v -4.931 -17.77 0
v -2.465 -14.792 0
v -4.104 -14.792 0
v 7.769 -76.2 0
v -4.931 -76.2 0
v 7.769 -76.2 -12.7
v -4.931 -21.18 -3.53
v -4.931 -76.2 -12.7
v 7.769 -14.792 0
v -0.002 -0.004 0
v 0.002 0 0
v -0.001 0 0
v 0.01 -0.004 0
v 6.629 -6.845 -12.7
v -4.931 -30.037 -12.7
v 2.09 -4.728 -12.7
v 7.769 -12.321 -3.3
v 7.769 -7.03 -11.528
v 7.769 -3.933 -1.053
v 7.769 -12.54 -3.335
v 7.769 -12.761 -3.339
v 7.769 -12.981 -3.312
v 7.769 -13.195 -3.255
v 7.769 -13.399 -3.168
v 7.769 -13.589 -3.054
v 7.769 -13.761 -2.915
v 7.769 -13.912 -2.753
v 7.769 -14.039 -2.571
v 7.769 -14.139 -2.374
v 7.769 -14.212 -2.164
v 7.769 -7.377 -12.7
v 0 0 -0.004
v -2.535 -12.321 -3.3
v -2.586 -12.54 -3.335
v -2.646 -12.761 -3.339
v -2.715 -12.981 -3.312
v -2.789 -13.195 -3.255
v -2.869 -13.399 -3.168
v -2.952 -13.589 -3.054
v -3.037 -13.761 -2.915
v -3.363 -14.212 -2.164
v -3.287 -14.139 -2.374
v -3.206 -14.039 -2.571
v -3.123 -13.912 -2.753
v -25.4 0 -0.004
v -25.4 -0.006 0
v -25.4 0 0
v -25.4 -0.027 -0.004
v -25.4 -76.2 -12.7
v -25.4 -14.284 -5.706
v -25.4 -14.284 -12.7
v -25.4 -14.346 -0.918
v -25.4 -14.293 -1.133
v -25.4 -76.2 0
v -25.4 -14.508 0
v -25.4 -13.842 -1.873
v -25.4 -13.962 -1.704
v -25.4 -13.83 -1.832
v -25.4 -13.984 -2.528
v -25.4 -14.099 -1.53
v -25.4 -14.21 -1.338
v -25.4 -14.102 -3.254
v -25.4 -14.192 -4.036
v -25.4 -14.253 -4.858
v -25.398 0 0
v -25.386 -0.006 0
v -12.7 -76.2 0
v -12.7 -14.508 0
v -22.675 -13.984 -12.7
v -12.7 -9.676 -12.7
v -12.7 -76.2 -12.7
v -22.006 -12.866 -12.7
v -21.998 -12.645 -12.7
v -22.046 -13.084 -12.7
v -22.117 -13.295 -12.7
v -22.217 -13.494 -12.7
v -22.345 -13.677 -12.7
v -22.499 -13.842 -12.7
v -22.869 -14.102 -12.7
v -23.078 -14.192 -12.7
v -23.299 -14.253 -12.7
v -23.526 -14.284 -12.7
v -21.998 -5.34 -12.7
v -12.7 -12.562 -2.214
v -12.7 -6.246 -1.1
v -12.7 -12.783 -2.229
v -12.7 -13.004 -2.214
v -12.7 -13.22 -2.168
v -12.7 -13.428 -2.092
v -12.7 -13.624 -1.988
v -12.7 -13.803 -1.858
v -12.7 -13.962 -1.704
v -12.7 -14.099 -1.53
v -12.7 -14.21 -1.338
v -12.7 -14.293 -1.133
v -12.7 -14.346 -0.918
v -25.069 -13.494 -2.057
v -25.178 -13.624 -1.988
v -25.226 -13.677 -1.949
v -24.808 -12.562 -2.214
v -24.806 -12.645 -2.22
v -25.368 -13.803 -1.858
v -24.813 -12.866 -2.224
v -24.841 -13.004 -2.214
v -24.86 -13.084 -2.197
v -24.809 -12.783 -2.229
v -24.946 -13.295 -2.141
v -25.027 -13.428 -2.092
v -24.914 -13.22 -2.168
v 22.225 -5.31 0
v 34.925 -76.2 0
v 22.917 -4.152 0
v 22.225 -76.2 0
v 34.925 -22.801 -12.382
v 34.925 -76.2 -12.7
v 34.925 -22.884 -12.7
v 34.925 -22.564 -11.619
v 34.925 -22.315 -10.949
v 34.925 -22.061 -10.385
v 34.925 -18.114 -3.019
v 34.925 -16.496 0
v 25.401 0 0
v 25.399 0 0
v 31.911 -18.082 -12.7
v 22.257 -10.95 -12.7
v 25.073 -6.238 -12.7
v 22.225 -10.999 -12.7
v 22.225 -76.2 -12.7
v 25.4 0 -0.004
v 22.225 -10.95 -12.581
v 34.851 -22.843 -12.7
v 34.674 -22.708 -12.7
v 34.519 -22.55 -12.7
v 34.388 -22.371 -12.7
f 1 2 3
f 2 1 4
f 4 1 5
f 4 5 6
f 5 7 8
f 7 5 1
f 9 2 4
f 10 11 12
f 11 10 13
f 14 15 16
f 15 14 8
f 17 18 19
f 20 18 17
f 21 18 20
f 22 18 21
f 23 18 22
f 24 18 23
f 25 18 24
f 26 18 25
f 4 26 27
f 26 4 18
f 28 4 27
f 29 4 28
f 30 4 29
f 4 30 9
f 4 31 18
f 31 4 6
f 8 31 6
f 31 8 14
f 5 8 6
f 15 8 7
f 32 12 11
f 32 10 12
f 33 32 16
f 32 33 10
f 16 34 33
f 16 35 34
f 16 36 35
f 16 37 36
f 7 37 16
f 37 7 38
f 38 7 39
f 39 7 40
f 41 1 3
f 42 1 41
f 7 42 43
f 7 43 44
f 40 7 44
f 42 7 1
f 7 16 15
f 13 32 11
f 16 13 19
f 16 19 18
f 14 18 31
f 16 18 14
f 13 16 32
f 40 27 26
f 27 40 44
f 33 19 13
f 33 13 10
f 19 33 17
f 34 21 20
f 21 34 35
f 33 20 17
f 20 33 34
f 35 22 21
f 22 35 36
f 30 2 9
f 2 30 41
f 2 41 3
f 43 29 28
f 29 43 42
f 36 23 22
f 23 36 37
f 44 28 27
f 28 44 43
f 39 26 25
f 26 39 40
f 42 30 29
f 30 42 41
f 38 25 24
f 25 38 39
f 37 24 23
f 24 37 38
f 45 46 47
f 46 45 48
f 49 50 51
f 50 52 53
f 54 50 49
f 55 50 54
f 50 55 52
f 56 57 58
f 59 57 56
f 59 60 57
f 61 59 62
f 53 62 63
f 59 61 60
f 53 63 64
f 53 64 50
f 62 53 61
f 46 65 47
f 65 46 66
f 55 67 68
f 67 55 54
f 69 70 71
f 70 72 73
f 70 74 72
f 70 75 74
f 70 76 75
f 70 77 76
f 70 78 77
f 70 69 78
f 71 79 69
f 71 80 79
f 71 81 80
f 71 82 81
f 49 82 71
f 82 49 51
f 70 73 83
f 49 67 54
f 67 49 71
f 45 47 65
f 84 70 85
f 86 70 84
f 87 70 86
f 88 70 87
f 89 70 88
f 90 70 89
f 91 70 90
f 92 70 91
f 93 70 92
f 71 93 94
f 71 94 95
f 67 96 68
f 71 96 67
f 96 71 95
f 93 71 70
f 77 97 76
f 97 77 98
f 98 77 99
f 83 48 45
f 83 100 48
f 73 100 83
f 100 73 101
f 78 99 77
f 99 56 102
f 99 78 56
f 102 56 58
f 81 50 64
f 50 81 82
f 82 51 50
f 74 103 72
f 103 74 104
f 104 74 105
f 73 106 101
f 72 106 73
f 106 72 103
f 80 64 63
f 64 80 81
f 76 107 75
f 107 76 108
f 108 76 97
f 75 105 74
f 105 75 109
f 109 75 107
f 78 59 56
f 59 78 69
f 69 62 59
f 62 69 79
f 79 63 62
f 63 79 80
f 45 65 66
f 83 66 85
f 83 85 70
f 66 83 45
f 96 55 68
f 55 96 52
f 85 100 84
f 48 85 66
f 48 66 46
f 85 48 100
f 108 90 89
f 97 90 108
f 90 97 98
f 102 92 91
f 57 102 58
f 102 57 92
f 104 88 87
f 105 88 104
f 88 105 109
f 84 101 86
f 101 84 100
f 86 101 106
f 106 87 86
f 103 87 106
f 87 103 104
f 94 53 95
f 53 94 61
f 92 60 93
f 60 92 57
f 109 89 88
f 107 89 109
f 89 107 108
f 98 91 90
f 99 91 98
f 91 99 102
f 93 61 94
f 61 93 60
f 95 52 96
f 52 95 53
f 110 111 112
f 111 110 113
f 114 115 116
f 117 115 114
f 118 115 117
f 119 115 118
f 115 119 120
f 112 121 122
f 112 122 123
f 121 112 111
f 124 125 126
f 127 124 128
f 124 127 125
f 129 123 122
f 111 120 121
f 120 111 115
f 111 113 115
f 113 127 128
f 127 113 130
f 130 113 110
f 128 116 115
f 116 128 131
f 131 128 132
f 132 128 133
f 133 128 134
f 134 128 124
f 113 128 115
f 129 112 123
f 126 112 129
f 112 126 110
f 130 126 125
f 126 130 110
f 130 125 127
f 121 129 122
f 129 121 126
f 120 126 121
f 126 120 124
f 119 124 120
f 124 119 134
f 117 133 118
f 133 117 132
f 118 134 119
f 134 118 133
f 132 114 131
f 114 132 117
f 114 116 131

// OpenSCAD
// Copyright 2019 Michael K Johnson
// Use allowed under Attribution 4.0 International (CC BY 4.0) license terms
// https://creativecommons.org/licenses/by/4.0/legalcode
// Model of Mikey's Square, Knife, and Threading Tools
// https://www.hobby-machinist.com/threads/models-for-grinding-hss-lathe-tools.62111/
// Scale 200-500% for printing, reducing length, to see closely
// All parameters are in inches, because that's common use
// https://me-mechanicalengineering.com/single-point-cutting-tool/ has definitions

// Stock is assumed to be square in cross section
stock_width = 0.5;
// Typical stock is 3-6 inches long; can reduce to print enlarged models to concentrate on shape of tip
stock_len = 3;
// To model the curve from the wheel; 6" and 8" are common
wheel_diameter = 8;
// Wheel or platen thickness; matters only if using this for visualizations
wheel_thickness = 1;
// Radius of the edge of the wheel/platen; shows at back edge of top cut
wheel_edge_radius = .0625;
// Common radii are .0156 (1/64") .03125 (1/32") .0625 (1/16") (Nose radius currently ignored)
nose_radius = .03125;
knife_nose_radius = 0.156;
// Side Cutting Edge Angle (SCEA)
side_cutting_edge_angle = 15;
// End Cutting Edge Angle (ECEA) is derived from the included angle of the tip, and is normally less than 90
tip_included_angle = 80;
knife_tip_included_angle = 65;
threading_tip_included_angle = 60;
// Back Rake (BR) 
back_rake_angle = 15;
// Back Rake depth ratio (depth of back rake relative to stock width; reduce for high BR)
back_rake_depth_ratio = 1;
// Knife Back Rake (BR) (knife tool)
knife_back_rake_angle = 10;
// Side Rake (SR)
side_rake_angle = 15;
// Side Relief
side_relief_angle = 15;
// End Relief ("Clearance")
end_relief_angle = 15;
// How far back the top of the tool the side cut extends, relative to the width of the stock; typically between 1 and 2
side_edge_aspect_ratio = 1.5;
threading_side_edge_aspect_ratio = 0.5;
// use_platen: true for belt grinder platen, false for wheel grinder
use_platen = true;

/* [Hidden] */

// true to use simple shapes for fast rendering while developing; false for more accurate shapes for final renders
fast_render = false;

function mm(inches) = inches * 25.4;

stock_w = mm(stock_width);
stock_l = mm(stock_len);
wheel_r = mm(wheel_diameter) / 2;
wheel_t = mm(wheel_thickness);
wheel_e_r = mm(wheel_edge_radius);
nose_r = mm(nose_radius);
knife_nose_r = mm(knife_nose_radius);

// Logical pre-rounded tip located at -pivot_offset
function pivot_offset(scea=side_cutting_edge_angle, sear=side_edge_aspect_ratio) = -mm(sear * stock_width) * sin(scea);

module smooth_wheel(r=wheel_r, t=wheel_t) {
    x = t/2 - wheel_e_r;
    y = r - mm(0.5);
    translate([0, r, 0])
    rotate([0, 90, 0])
    rotate_extrude($fa=1)
    rotate([0, 0, 90])
    translate([0, -(r-wheel_e_r), 0])
    hull() {
        translate([x, 0, 0]) circle(r=wheel_e_r, $fn=45);
        translate([-x, 0, 0]) circle(r=wheel_e_r, $fn=45);
        translate([x, y, 0]) circle(r=wheel_e_r, $fn=45);
        translate([-x, y, 0]) circle(r=wheel_e_r, $fn=45);
    }
}
module wheel(r=wheel_r, t=wheel_t) {
    z = -stock_w/2; // honed angles at edges will be as set
    // simple cylinder
    if (fast_render) {
        translate([-t/2, r, z]) rotate([90, 0, 90])
        cylinder(r=r, h=t, $fa=1);
    } else {
        smooth_wheel(r, t);
    }
}
module platen(h=wheel_r, t=wheel_t) {
    hull() {
        // front of platen
        translate([t/2, wheel_e_r, -h/2])
            cylinder(r=wheel_e_r, h=h, $fn=45);
        translate([-t/2, wheel_e_r, -h/2])
            cylinder(r=wheel_e_r, h=h, $fn=45);
        // extend it back to represent what will be cut out
        translate([t/2, t, -h/2])
            cylinder(r=wheel_e_r, h=h, $fn=45);
        translate([-t/2, t, -h/2])
            cylinder(r=wheel_e_r, h=h, $fn=45);
    }
}
module surface(t=wheel_t) {
    if (use_platen) {
        platen(t=t);
    } else {
        wheel(t=t);
    }
}
module stock(w=stock_w, l=stock_l, scea=side_cutting_edge_angle, sear=side_edge_aspect_ratio) {
    // origin is pivot point for cuts, oriented to be like using a wheel
    translate([pivot_offset(scea=scea, sear=sear), -l, -w])
        cube([w, l, w]);
}
module side_cut(br=back_rake_angle, era=end_relief_angle, sra=side_relief_angle, scea=side_cutting_edge_angle, sear=side_edge_aspect_ratio) {
    z = 90-scea;
    t = (scea*sra*era*br == 0) ? wheel_t : ((-pivot_offset(scea=scea, sear=sear))+(tan(sra)*stock_w)+(tan(era)*stock_w)+(tan(br)*stock_w)/sin(scea) + wheel_e_r*4) * 2;
    echo(t);
    rotate([0, -sra, 0])
    rotate([0, 0, z])
    difference() {
        rotate([0, 0, -z])
        rotate([0, sra, 0])
            stock(scea=scea, sear=sear);
        surface(t=t);
    }
}
module end_cut(tia=tip_included_angle, br=back_rake_angle, era=end_relief_angle, sra=side_relief_angle, scea=side_cutting_edge_angle, sear=side_edge_aspect_ratio) {
    z = (90-tia)+scea;
    rotate([0, 0, -z])
    rotate([-era, 0, 0])
    difference() {
        rotate([era, 0, 0])
        rotate([0, 0, z])
            side_cut(br=br, era=era, sra=sra, scea=scea, sear=sear);
        translate([wheel_t/2-wheel_e_r, 0, 0]) surface();
    }
}
module nose_radius(nr=nose_r, tia=tip_included_angle, br=back_rake_angle, era=end_relief_angle, sre=side_relief_angle, scea=side_cutting_edge_angle, sear=side_edge_aspect_ratio) {
    // There is no chamfer function to follow the
    // the sharp edge with a clean curve
    // Should find a way to sufficiently approximate
    end_cut(tia=tia, br=br, era=era, sre=sra, scea=scea, sear=sear);
}
module top_cut(br=back_rake_angle, nr=nose_r, tia=tip_included_angle, era=end_relief_angle, sra=side_relief_angle, scea=side_cutting_edge_angle, sear=side_edge_aspect_ratio) {
    z = 90 + br;
    rotate([0, -90, 0])
    rotate([0, 0, -z])
    difference() {
        rotate([0, 0, z])
        rotate([0, 90, 0])
            nose_radius(nr=nr, tia=tia, br=br, era=era, sra=sra, scea=scea, sear=sear);
        surface(t=stock_w*2*back_rake_depth_ratio);
    }
}
module square_tool(br=back_rake_angle, nr=nose_r, tia=tip_included_angle, era=end_relief_angle, sra=side_relief_angle, scea=side_cutting_edge_angle, sear=side_edge_aspect_ratio) {
    top_cut(br=br, nr=nr, tia=tia, br=br, era=era, sra=sra, scea=scea, sear=sear);
}
module knife_tool(br=knife_back_rake_angle, nr=knife_nose_r, tia=knife_tip_included_angle, era=end_relief_angle, sra=side_relief_angle, scea=0, sear=0) {
    top_cut(br=br, nr=nr, tia=tia, br=br, era=era, sra=sra, scea=scea, sear=sear);
}
module threading_tool(br=0, nr=0, tia=threading_tip_included_angle, era=end_relief_angle, sra=side_relief_angle, scea=threading_tip_included_angle/2, sear=threading_side_edge_aspect_ratio) {
    // no top cut or nose radius
    end_cut(tia=tia, br=br, era=era, sra=sra, scea=scea, sear=sear);
}
square_tool();
//knife_tool();
//threading_tool();
translate([-2*stock_w, 0, 0]) knife_tool();
translate([2*stock_w, 0, 0]) threading_tool();
